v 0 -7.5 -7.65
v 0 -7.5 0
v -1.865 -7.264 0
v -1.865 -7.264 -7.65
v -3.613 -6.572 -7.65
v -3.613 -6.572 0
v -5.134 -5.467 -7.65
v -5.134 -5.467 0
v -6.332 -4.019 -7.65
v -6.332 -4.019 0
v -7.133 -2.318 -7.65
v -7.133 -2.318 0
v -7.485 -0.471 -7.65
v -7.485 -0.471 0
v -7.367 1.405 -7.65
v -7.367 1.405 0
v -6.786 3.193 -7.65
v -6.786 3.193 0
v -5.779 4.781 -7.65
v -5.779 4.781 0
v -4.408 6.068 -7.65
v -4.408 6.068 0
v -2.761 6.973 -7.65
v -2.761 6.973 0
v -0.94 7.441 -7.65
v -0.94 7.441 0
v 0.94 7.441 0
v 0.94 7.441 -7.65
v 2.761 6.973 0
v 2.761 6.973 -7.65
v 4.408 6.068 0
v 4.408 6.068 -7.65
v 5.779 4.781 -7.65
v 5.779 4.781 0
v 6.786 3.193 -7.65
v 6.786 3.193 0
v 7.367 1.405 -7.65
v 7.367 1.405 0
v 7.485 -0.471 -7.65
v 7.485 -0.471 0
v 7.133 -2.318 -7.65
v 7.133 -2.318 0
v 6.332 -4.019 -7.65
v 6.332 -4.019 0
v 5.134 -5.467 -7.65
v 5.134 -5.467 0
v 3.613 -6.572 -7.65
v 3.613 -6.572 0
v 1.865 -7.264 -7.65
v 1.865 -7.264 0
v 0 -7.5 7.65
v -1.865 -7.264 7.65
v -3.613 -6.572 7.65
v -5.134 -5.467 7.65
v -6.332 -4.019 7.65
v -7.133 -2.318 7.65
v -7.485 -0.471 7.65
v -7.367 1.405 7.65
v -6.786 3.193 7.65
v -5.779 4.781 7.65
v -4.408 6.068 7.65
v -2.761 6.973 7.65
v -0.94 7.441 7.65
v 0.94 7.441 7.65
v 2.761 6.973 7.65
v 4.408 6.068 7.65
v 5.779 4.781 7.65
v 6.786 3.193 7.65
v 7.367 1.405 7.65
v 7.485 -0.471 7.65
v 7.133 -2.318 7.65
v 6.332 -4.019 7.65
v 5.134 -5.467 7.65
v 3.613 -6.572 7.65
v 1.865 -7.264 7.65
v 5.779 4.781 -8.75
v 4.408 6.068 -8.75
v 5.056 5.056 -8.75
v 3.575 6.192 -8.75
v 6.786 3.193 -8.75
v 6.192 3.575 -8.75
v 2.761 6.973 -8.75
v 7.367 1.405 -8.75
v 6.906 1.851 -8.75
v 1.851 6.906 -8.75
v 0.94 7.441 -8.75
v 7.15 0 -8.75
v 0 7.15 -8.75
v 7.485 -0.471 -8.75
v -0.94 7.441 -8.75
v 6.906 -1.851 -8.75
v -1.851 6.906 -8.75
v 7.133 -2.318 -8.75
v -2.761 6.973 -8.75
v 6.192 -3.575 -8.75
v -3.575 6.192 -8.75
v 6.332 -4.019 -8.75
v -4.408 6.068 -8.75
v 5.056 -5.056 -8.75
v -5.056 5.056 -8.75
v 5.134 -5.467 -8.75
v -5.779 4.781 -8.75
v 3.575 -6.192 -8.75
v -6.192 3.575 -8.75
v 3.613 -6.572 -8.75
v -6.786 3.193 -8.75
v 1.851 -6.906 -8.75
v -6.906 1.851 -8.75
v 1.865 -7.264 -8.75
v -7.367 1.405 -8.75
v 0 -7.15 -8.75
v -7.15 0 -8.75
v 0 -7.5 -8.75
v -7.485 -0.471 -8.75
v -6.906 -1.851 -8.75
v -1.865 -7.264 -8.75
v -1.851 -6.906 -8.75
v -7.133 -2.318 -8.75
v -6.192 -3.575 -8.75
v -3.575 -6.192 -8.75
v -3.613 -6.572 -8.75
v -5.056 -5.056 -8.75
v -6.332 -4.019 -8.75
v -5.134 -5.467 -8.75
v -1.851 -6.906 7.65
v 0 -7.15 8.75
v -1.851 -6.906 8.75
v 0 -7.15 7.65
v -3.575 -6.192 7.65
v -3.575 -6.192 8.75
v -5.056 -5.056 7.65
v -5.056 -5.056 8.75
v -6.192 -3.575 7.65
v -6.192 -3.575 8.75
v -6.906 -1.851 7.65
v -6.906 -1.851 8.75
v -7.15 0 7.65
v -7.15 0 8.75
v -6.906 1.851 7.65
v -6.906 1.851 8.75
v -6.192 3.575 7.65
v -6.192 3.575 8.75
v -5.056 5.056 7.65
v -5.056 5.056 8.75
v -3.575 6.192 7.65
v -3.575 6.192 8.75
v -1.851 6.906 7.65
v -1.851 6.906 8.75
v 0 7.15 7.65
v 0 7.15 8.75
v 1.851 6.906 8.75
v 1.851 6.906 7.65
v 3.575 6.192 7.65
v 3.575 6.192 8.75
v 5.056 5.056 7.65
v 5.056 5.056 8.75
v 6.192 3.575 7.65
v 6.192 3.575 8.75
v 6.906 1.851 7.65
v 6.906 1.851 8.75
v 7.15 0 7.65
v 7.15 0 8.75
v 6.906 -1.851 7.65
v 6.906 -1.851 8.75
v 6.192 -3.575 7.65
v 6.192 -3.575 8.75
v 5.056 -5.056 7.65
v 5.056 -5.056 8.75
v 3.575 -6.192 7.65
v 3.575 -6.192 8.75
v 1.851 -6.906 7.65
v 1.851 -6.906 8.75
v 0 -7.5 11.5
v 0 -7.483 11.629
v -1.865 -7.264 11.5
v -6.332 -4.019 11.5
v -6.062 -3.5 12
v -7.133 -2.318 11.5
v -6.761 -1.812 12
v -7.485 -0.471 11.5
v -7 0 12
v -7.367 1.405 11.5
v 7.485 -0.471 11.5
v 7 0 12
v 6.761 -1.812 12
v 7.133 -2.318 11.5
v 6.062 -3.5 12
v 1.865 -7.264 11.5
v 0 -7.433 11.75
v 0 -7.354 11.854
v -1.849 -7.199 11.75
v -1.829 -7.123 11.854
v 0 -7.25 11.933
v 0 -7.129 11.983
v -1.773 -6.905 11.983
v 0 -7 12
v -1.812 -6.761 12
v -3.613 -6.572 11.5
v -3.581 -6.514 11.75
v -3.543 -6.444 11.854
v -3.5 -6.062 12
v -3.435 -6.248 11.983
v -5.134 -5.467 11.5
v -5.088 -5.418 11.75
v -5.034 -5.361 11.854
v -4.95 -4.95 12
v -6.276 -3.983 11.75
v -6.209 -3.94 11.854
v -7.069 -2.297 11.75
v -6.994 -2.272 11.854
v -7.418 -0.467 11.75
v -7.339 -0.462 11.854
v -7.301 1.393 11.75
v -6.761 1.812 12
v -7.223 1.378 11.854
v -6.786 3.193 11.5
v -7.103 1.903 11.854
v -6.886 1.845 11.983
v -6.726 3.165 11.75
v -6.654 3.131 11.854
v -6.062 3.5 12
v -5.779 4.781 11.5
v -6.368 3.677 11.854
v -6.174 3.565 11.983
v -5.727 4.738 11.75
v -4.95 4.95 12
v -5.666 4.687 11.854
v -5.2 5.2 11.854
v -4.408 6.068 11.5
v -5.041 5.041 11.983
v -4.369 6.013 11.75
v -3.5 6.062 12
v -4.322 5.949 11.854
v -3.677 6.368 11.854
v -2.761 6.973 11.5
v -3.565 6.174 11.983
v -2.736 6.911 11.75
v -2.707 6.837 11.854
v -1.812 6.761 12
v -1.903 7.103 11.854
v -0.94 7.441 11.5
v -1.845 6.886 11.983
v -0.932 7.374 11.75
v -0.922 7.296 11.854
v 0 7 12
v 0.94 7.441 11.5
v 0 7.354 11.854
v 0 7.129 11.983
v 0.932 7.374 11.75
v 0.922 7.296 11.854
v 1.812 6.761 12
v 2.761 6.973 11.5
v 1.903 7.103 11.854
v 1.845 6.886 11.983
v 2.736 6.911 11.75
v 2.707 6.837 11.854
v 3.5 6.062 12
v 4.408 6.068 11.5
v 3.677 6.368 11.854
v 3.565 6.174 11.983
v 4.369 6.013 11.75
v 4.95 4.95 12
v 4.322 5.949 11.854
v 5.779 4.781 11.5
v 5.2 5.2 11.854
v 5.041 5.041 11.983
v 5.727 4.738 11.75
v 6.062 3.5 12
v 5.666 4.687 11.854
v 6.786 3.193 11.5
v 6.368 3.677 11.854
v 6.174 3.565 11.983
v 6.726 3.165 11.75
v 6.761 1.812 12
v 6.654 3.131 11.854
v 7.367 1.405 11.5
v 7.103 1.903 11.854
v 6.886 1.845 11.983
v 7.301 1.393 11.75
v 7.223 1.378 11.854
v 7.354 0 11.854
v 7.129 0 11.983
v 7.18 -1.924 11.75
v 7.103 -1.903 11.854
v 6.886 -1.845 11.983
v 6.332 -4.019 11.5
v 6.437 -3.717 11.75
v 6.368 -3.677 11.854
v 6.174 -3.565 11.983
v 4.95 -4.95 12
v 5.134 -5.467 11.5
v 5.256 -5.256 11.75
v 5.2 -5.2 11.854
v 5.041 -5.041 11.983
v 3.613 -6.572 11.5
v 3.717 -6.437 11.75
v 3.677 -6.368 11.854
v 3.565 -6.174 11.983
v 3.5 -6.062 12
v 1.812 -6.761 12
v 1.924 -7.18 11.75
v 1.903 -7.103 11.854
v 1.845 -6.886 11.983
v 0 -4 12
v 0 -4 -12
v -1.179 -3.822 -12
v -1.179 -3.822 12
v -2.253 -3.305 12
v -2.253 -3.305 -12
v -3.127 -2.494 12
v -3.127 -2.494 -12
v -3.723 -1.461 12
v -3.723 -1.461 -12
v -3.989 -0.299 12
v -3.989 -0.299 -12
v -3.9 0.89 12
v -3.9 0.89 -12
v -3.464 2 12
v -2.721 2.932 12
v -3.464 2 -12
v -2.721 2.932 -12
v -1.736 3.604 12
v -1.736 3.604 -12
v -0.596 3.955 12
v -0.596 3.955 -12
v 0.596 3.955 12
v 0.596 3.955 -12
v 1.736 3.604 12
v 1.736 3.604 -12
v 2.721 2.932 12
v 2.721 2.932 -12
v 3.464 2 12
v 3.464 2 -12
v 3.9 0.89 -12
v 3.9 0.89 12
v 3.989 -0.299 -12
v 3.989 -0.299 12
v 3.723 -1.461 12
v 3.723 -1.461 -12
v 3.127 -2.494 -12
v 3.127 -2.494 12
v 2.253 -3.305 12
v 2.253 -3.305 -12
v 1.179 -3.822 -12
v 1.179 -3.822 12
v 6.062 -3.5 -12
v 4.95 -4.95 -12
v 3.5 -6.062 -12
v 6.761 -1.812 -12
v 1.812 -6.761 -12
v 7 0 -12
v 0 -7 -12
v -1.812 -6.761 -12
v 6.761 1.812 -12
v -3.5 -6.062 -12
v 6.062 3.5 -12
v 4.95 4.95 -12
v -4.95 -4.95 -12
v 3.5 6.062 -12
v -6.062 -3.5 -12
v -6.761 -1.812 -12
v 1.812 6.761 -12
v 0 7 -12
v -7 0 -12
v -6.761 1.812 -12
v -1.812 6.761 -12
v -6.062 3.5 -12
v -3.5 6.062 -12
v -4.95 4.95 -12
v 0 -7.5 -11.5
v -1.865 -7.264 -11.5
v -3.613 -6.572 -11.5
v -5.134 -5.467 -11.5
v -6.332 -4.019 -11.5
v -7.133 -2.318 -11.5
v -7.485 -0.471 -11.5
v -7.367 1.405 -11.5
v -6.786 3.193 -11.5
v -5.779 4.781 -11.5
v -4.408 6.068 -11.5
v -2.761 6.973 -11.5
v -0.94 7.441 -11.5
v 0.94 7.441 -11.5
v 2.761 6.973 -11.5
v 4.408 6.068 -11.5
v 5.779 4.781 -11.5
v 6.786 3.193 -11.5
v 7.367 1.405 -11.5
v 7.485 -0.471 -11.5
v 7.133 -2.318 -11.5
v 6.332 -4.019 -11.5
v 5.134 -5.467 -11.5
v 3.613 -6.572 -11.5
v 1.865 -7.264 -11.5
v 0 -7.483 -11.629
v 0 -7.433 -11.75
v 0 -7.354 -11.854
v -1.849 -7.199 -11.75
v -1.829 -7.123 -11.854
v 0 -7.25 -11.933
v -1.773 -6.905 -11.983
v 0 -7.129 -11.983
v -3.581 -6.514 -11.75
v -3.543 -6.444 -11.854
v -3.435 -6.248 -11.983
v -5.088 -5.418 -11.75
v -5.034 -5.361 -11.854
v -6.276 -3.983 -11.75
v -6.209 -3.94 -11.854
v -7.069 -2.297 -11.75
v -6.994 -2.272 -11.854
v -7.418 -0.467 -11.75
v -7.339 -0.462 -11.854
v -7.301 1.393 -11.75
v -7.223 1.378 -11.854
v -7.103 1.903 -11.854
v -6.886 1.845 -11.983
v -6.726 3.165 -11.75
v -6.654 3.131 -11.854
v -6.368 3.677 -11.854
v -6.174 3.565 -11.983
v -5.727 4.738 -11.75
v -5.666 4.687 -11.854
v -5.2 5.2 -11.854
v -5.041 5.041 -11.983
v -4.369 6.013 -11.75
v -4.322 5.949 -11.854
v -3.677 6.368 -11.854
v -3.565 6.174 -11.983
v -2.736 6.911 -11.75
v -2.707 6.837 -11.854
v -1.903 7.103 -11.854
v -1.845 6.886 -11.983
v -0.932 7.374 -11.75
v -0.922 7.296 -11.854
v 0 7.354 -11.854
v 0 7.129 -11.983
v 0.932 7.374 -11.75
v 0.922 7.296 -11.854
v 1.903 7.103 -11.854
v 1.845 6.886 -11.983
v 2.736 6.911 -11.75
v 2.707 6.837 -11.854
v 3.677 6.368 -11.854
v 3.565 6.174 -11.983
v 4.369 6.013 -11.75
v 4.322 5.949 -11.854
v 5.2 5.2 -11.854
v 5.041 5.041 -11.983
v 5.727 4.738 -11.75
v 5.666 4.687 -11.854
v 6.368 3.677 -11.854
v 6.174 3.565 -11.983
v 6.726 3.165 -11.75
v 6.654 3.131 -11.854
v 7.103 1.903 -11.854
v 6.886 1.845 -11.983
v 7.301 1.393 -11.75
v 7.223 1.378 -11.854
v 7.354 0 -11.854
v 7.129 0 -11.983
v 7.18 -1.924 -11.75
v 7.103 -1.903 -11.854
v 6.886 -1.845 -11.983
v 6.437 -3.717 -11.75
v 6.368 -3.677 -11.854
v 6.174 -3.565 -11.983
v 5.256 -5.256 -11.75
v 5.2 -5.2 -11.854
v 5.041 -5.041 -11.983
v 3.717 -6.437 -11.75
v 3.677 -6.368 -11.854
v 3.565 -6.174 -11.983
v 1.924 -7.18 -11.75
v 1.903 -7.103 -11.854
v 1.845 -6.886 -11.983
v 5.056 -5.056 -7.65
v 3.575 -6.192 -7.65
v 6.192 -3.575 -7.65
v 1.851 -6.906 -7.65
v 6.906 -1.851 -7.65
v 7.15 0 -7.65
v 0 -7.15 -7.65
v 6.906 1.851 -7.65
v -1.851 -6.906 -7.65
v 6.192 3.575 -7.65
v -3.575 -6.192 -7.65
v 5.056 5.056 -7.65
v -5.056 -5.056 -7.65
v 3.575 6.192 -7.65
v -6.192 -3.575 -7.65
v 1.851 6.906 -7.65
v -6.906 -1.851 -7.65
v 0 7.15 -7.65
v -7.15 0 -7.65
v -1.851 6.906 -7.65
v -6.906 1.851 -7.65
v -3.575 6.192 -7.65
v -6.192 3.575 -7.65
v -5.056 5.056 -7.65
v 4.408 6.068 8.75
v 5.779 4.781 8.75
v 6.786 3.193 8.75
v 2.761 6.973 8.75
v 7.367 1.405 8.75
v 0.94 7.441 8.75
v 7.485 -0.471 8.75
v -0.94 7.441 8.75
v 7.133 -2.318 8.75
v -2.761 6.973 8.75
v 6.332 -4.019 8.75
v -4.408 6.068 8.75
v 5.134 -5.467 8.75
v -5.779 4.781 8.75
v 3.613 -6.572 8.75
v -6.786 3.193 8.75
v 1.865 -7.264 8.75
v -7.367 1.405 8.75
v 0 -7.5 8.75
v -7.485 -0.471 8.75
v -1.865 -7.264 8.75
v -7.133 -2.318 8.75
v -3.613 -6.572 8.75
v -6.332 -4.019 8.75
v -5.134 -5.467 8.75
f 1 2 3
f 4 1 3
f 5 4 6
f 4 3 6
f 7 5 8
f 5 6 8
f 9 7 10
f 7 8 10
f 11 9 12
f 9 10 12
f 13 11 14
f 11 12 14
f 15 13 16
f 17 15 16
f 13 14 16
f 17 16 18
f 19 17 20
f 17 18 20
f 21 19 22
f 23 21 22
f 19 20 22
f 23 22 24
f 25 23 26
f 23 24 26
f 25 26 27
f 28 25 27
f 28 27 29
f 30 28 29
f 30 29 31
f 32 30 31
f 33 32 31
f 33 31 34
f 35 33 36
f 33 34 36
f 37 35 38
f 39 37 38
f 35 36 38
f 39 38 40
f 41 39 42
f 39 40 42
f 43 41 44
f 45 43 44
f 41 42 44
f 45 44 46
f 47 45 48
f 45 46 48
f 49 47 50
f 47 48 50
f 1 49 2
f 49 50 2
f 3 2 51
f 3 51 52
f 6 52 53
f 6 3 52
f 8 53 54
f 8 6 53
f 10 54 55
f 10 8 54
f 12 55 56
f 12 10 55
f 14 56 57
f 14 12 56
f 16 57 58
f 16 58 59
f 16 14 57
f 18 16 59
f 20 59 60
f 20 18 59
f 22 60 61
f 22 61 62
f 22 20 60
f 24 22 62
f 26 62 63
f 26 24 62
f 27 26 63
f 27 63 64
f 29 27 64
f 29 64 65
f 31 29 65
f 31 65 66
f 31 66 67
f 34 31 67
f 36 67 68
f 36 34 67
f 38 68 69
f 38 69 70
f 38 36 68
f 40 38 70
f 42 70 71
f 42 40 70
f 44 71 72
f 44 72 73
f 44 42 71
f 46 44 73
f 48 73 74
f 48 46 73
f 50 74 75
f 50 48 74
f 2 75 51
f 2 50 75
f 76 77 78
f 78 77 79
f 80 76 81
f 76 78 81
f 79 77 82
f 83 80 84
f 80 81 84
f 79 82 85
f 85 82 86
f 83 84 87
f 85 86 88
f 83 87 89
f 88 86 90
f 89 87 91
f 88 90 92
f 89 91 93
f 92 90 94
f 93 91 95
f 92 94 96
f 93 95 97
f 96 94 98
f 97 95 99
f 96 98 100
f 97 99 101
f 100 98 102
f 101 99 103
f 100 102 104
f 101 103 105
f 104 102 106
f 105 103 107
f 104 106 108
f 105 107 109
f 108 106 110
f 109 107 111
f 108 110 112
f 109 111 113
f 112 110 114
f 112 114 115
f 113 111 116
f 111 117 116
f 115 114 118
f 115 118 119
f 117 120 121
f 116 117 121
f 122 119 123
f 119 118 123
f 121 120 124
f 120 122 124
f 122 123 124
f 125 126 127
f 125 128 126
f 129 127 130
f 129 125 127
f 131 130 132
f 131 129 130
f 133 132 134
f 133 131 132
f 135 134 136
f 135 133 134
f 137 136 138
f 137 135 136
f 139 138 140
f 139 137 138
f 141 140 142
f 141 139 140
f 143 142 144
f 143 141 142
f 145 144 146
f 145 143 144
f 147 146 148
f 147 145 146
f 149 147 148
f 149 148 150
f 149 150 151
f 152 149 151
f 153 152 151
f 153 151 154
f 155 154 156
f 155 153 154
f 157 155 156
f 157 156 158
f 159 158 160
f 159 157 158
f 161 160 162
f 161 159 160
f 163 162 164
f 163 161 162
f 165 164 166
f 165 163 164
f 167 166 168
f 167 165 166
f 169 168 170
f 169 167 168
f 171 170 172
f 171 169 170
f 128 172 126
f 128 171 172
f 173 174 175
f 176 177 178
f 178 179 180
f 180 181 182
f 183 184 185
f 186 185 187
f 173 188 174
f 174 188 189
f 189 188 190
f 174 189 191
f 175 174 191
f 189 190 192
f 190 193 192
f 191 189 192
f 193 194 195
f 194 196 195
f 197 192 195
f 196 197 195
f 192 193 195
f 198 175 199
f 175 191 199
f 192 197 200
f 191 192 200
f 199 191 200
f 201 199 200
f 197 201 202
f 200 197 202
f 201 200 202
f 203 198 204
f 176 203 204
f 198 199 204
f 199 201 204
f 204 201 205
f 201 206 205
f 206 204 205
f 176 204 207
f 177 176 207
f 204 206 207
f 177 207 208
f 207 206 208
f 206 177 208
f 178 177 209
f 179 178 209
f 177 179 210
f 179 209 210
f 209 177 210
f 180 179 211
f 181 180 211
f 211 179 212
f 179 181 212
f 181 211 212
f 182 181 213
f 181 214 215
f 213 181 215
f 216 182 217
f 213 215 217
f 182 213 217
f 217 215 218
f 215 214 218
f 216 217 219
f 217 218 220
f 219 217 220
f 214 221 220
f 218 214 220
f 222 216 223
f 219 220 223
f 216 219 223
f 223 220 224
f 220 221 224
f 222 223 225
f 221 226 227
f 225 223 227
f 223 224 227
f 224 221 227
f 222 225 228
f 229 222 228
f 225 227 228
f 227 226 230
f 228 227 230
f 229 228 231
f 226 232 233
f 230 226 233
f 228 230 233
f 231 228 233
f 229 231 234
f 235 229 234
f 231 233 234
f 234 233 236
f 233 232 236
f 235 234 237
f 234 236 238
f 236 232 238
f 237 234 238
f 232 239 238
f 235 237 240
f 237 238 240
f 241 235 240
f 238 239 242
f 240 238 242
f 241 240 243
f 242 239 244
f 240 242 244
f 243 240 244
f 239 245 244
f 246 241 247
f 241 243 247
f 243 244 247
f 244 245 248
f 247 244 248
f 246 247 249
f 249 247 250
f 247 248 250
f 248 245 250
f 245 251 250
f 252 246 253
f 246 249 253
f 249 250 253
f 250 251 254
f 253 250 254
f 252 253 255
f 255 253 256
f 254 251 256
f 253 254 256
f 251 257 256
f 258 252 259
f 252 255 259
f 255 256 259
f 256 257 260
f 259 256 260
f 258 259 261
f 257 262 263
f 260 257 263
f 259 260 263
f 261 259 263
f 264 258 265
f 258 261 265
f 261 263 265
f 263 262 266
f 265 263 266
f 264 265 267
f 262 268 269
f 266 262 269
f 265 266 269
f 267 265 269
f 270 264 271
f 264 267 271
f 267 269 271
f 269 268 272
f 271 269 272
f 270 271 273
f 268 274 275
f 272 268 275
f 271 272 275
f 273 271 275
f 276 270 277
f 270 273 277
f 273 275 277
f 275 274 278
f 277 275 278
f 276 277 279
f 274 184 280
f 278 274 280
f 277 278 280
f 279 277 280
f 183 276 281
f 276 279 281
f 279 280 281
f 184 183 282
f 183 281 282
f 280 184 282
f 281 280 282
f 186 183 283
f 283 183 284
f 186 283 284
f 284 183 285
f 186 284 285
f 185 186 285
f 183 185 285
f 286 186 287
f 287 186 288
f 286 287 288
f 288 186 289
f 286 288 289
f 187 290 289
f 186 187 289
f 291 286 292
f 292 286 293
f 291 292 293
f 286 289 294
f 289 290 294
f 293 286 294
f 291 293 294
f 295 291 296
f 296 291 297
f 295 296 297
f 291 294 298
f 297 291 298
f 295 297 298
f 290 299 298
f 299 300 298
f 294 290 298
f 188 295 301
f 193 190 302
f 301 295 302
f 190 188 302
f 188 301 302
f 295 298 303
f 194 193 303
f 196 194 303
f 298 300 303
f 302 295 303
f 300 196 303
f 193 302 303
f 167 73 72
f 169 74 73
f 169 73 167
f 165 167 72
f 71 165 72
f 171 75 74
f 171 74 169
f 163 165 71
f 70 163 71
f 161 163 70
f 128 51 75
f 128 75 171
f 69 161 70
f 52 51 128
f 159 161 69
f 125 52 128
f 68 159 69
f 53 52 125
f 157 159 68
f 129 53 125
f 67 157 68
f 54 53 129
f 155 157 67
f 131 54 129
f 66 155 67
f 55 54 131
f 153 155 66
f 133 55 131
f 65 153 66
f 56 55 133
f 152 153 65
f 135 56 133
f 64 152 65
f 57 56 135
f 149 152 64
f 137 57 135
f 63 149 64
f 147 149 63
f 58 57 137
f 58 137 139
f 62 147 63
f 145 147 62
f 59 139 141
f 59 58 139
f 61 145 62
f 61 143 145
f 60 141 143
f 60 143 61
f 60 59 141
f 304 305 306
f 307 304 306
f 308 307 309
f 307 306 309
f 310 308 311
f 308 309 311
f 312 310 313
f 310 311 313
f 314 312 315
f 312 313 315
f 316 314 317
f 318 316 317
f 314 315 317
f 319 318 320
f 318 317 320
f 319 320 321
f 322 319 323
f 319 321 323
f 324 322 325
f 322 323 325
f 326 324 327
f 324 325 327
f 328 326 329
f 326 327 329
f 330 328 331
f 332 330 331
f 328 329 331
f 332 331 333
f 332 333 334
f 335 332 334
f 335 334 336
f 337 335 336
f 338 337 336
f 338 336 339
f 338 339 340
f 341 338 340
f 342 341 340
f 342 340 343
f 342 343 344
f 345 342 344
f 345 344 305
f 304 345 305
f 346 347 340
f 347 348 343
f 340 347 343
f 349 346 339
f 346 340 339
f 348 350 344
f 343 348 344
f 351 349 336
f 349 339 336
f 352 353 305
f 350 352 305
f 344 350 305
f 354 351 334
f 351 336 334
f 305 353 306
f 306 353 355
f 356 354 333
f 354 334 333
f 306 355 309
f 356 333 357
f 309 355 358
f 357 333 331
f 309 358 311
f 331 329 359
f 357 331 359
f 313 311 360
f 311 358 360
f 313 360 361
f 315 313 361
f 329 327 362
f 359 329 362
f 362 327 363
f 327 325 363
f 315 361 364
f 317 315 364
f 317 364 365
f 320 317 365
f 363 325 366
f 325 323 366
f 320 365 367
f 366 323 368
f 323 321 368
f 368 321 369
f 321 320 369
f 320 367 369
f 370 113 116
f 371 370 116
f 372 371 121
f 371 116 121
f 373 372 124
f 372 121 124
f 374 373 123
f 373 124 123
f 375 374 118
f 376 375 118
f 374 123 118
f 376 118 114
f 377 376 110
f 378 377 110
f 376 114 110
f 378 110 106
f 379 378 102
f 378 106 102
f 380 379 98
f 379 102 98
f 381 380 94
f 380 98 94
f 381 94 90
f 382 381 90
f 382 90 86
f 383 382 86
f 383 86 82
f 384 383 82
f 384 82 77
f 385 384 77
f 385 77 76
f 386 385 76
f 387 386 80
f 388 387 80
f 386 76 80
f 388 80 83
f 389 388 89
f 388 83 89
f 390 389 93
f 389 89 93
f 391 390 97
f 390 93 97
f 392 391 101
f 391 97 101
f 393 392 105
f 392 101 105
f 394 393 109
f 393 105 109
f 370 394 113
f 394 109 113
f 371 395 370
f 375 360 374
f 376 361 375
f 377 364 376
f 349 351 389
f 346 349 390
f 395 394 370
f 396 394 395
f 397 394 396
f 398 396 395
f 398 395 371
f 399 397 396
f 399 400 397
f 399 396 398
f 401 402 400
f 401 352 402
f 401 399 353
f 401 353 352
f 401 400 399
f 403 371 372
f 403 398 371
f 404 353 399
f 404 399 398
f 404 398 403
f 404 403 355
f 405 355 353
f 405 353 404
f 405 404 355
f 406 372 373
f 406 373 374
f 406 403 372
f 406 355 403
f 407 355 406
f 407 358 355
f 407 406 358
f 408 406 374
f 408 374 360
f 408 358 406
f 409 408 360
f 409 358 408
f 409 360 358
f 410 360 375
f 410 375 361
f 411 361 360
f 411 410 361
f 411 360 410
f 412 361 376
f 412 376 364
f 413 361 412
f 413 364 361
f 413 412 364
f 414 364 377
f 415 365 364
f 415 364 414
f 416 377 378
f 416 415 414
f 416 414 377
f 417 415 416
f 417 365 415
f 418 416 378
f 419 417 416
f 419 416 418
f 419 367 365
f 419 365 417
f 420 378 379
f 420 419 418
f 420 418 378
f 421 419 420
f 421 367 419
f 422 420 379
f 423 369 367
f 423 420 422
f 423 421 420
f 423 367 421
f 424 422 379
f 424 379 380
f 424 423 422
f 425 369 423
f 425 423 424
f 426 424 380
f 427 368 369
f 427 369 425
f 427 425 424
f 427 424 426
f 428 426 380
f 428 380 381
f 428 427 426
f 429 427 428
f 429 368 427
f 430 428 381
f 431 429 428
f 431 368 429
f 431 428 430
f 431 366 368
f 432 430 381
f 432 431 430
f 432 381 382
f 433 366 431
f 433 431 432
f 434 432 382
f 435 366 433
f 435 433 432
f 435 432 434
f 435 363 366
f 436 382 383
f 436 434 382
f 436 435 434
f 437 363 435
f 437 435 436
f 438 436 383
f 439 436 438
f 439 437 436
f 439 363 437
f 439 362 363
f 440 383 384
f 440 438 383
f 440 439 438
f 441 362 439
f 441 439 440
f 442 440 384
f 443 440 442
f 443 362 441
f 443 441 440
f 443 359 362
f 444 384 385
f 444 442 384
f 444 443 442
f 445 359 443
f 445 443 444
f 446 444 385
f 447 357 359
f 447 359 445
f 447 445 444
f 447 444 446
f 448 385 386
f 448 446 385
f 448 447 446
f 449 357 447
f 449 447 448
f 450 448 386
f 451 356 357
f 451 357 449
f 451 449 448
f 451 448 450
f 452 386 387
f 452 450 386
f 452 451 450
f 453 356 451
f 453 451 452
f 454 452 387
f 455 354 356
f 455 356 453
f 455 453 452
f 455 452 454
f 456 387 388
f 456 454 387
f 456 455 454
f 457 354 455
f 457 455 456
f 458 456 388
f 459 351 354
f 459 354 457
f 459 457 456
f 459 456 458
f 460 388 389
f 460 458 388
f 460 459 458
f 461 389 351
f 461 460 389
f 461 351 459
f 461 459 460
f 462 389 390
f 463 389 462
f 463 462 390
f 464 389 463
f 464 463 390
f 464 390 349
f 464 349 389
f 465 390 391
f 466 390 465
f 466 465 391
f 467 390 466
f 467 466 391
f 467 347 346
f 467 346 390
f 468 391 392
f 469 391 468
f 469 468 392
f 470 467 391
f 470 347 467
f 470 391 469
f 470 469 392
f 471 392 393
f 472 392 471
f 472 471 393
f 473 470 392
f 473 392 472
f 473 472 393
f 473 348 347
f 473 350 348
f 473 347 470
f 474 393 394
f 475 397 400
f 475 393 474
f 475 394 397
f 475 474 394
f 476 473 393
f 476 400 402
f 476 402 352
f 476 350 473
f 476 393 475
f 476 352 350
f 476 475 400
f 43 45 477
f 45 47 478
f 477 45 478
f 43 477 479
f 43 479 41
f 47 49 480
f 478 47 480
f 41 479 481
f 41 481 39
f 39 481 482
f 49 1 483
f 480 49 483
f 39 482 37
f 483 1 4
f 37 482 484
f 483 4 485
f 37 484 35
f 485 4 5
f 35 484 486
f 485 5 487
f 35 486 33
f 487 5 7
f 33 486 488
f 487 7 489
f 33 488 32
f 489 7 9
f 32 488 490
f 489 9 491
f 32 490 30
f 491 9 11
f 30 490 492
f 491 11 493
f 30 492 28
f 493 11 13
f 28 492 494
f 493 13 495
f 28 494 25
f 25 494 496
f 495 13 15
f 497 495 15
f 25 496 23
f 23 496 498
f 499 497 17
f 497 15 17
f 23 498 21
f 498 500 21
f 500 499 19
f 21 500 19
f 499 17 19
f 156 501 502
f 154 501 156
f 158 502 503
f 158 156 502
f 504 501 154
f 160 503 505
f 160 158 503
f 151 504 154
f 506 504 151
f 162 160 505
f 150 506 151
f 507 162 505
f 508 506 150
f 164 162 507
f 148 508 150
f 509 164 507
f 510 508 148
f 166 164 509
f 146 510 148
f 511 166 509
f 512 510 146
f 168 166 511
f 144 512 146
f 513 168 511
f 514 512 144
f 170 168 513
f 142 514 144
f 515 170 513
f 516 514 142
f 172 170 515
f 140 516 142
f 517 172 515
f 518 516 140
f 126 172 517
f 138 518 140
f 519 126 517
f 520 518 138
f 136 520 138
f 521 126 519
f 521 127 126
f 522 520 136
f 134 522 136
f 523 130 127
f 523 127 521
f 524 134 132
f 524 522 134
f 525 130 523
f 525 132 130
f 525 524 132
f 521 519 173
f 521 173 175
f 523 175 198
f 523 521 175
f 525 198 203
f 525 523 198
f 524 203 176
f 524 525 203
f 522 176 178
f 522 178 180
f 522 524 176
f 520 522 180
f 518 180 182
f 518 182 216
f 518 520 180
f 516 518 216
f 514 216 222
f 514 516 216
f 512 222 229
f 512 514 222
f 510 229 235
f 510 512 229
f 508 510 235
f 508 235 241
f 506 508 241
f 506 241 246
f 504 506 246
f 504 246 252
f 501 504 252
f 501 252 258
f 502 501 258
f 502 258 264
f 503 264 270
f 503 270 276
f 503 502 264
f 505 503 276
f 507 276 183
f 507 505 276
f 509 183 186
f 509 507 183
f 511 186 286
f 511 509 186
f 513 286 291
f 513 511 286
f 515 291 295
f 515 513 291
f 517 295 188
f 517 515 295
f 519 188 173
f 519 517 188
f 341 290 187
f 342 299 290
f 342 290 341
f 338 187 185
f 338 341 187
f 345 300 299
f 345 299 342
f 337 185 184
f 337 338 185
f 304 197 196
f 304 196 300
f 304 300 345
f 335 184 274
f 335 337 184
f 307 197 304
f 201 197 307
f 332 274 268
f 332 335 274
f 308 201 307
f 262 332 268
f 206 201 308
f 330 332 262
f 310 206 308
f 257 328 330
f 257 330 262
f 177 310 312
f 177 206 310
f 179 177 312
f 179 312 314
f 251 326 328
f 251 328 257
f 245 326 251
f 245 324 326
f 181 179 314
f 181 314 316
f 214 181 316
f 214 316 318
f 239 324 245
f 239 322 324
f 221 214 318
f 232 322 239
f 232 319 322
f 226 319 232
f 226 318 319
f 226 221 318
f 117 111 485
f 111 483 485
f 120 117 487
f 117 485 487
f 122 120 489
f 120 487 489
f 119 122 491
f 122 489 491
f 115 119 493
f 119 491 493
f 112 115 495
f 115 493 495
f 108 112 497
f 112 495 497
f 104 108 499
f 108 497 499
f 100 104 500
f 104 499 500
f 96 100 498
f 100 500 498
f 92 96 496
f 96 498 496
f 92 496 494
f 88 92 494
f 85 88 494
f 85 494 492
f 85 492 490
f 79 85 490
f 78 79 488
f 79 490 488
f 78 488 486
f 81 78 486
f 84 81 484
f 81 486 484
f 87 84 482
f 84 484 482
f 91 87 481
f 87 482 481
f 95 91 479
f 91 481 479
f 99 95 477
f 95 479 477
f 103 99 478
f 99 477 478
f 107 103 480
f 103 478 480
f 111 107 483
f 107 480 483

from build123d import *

# Parameters (mm, degrees)
FILLET2_R = 0.5
FILLET3_R = 0.5


with BuildPart() as part:
    # Sketch1 → Revolve1 (revolve)
    with BuildSketch(Plane(origin=(0, 0, 0), x_dir=(0, 0, -1), z_dir=(1, 0, 0))):
        Polygon((-12, -7.5), (-8.75, -7.5), (-8.75, -7.15), (-7.65, -7.15), (-7.65, -7.5), (0, -7.5), (0, -4), (-12, -4), align=None)
    revolve1 = revolve(axis=Axis((0, 0, 1000), (0, 0, -1)))

    # Fillet2
    fillet2_edges = [part.edges().sort_by_distance(p)[0] for p in [
        (0, 7.5, 12),
    ]]
    fillet(fillet2_edges, radius=FILLET2_R)

    # Mirror2: Revolve1 across plane
    add(revolve1.mirror(Plane(origin=(0, -4, 0), x_dir=(1, 0, 0), z_dir=(0, 0, -1))))

    # Fillet3
    fillet3_edges = [part.edges().sort_by_distance(p)[0] for p in [
        (0, 7.5, -12),
    ]]
    fillet(fillet3_edges, radius=FILLET3_R)


solid = part.part
